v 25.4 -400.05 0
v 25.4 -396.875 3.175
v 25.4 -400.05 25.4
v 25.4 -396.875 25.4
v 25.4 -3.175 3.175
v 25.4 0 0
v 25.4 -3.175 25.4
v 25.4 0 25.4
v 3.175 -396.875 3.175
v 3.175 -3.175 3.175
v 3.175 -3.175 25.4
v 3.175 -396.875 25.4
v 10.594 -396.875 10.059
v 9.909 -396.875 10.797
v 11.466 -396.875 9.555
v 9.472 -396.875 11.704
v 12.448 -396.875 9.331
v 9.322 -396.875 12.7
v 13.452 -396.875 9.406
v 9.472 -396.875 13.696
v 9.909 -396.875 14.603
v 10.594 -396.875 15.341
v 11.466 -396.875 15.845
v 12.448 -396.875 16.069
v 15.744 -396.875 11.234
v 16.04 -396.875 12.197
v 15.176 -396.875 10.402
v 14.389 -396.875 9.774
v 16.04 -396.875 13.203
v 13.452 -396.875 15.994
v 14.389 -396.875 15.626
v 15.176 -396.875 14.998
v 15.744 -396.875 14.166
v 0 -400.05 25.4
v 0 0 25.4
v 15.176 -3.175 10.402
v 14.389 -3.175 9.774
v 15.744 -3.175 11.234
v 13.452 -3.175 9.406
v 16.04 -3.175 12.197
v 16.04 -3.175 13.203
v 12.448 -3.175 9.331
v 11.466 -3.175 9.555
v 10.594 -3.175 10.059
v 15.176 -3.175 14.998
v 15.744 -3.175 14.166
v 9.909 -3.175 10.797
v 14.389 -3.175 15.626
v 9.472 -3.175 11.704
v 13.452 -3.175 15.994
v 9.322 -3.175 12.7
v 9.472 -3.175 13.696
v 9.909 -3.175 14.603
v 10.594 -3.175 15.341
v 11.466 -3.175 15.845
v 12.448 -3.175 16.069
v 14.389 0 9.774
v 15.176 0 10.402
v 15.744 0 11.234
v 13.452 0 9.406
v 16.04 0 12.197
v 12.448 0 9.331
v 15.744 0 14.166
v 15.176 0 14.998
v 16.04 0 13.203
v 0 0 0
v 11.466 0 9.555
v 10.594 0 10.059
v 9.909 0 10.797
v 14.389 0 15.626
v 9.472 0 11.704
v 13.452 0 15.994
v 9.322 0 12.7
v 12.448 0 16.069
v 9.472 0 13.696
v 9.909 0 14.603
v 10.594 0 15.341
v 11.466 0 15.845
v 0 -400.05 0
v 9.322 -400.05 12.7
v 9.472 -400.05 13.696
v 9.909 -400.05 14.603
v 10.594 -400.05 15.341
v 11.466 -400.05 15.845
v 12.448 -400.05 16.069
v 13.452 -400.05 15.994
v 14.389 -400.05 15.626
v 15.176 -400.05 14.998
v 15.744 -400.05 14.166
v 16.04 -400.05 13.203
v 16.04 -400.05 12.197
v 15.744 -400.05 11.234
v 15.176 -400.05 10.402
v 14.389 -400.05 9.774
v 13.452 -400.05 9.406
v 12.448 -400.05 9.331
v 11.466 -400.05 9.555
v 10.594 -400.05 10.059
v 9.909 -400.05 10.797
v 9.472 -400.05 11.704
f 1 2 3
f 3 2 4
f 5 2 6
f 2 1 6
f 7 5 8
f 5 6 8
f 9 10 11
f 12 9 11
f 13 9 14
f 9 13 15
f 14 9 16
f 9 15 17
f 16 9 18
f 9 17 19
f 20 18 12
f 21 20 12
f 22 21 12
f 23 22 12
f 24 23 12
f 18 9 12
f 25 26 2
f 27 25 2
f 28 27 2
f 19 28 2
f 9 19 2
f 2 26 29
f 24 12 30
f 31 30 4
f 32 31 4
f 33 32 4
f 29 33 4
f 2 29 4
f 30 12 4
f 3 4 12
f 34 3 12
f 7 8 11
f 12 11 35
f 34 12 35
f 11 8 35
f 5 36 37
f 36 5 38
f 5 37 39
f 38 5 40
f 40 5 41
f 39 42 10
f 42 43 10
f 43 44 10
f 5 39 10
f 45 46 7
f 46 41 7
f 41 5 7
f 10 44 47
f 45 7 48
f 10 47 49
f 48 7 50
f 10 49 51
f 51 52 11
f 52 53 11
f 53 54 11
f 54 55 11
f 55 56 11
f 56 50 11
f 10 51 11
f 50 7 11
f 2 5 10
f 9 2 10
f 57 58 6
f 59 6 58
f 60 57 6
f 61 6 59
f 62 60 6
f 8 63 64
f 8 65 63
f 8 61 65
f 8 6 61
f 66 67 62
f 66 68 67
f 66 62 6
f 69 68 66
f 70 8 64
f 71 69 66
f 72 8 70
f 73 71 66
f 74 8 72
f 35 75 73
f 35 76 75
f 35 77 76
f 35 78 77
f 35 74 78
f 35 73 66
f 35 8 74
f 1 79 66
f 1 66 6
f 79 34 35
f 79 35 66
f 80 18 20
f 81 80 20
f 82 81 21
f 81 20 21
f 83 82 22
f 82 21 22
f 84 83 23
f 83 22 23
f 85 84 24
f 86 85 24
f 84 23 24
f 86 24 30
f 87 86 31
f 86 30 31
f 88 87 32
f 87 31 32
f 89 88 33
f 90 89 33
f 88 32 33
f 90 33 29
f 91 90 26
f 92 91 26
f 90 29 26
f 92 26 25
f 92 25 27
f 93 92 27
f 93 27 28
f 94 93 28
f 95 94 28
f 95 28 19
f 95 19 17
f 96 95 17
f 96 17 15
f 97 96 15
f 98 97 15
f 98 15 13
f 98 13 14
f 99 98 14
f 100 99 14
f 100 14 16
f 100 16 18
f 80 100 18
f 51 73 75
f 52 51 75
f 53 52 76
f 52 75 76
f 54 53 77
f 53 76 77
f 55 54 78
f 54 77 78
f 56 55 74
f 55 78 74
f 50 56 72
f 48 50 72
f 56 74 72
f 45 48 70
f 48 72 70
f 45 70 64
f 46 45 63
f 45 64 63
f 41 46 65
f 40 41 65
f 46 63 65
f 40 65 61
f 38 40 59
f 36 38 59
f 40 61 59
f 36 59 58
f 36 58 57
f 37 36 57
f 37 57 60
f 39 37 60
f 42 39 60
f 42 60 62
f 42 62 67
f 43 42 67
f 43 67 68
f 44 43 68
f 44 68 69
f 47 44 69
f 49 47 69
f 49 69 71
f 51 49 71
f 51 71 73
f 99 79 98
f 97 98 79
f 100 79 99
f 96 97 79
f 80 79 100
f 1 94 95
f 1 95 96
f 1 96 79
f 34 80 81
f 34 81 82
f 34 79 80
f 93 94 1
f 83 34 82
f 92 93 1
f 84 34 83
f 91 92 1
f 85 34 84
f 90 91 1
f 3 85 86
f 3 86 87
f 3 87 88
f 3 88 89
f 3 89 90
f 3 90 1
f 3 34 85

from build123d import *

# Parameters (mm, degrees)
F1_DEPTH = 400.05
F2_W     = 22.225
F2_H     = 22.225
F3_DEPTH = 3.175
F4_W     = 22.225
F4_H     = 22.225
F5_DEPTH = 3.175
F7_D     = 6.7564


with BuildPart() as f1:
    # F0 (on Front) → F1 (new body)
    with BuildSketch(Plane.XZ):
        Polygon((0, 25.4), (0, 0), (25.4, 0), (25.4, 3.175), (3.175, 3.175), (3.175, 25.4), align=None)
    extrude(amount=F1_DEPTH)

    # F2 (on face) → F3 (join)
    with BuildSketch(Plane.XZ.offset(400.05)):
        with Locations((14.2875, 14.2875)):
            Rectangle(F2_W, F2_H)
    extrude(amount=-F3_DEPTH)

    # F4 (on face) → F5 (join)
    with BuildSketch(Plane(origin=(0, 0, 0), x_dir=(-1, 0, 0), z_dir=(0, 1, 0))):
        with Locations((-14.2875, 14.2875)):
            Rectangle(F4_W, F4_H)
    extrude(amount=-F5_DEPTH)

    # F7 (through all)
    with Locations(Plane.XZ.offset(400.05)):
        with Locations((12.7, 12.7)):
            Hole(F7_D / 2)


solid = f1.part
